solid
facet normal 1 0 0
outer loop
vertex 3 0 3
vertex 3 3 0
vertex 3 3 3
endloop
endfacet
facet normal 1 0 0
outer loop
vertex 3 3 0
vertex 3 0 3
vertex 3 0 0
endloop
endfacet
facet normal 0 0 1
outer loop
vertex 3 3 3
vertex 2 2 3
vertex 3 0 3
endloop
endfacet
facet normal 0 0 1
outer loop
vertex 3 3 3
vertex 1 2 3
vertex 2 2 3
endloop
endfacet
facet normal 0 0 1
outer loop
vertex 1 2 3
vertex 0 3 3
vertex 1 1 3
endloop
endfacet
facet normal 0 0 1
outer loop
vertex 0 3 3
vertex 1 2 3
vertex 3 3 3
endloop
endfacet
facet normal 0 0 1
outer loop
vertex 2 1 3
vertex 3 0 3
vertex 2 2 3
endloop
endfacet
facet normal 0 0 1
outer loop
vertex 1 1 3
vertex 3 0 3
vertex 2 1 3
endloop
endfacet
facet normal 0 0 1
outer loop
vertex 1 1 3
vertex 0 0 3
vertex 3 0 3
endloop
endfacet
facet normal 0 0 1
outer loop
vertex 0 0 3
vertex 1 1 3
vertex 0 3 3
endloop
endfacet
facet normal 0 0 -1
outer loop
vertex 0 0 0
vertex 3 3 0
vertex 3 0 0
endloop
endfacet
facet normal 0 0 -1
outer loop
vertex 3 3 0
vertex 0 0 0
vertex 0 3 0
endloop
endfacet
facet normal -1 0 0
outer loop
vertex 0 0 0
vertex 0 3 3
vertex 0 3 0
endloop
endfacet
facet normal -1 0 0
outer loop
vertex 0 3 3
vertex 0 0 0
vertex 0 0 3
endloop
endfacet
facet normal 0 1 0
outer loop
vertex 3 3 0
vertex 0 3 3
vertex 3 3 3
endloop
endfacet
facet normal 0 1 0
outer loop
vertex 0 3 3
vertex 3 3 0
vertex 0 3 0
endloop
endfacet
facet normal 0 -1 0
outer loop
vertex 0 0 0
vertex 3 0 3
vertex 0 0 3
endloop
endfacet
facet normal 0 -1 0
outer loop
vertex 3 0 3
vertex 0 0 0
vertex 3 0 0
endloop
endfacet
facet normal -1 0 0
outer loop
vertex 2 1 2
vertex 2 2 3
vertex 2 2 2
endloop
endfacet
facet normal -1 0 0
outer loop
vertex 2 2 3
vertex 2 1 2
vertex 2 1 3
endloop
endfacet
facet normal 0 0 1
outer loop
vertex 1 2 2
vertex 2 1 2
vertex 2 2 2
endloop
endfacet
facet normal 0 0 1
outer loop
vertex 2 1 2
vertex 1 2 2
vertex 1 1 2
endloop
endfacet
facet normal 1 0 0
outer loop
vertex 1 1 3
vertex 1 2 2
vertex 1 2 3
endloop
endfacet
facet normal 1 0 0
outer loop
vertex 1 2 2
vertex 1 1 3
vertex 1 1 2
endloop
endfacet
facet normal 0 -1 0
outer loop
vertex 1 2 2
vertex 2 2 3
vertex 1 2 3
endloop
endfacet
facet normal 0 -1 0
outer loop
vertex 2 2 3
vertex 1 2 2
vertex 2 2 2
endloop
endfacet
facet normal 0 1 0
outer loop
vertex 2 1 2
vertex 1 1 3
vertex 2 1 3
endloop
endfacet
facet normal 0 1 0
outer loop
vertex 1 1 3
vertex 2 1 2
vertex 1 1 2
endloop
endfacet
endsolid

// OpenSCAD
difference() {
    cube(3);
    translate([1, 1, 2]) {
        cube([1, 1, 2]);
    }
}
